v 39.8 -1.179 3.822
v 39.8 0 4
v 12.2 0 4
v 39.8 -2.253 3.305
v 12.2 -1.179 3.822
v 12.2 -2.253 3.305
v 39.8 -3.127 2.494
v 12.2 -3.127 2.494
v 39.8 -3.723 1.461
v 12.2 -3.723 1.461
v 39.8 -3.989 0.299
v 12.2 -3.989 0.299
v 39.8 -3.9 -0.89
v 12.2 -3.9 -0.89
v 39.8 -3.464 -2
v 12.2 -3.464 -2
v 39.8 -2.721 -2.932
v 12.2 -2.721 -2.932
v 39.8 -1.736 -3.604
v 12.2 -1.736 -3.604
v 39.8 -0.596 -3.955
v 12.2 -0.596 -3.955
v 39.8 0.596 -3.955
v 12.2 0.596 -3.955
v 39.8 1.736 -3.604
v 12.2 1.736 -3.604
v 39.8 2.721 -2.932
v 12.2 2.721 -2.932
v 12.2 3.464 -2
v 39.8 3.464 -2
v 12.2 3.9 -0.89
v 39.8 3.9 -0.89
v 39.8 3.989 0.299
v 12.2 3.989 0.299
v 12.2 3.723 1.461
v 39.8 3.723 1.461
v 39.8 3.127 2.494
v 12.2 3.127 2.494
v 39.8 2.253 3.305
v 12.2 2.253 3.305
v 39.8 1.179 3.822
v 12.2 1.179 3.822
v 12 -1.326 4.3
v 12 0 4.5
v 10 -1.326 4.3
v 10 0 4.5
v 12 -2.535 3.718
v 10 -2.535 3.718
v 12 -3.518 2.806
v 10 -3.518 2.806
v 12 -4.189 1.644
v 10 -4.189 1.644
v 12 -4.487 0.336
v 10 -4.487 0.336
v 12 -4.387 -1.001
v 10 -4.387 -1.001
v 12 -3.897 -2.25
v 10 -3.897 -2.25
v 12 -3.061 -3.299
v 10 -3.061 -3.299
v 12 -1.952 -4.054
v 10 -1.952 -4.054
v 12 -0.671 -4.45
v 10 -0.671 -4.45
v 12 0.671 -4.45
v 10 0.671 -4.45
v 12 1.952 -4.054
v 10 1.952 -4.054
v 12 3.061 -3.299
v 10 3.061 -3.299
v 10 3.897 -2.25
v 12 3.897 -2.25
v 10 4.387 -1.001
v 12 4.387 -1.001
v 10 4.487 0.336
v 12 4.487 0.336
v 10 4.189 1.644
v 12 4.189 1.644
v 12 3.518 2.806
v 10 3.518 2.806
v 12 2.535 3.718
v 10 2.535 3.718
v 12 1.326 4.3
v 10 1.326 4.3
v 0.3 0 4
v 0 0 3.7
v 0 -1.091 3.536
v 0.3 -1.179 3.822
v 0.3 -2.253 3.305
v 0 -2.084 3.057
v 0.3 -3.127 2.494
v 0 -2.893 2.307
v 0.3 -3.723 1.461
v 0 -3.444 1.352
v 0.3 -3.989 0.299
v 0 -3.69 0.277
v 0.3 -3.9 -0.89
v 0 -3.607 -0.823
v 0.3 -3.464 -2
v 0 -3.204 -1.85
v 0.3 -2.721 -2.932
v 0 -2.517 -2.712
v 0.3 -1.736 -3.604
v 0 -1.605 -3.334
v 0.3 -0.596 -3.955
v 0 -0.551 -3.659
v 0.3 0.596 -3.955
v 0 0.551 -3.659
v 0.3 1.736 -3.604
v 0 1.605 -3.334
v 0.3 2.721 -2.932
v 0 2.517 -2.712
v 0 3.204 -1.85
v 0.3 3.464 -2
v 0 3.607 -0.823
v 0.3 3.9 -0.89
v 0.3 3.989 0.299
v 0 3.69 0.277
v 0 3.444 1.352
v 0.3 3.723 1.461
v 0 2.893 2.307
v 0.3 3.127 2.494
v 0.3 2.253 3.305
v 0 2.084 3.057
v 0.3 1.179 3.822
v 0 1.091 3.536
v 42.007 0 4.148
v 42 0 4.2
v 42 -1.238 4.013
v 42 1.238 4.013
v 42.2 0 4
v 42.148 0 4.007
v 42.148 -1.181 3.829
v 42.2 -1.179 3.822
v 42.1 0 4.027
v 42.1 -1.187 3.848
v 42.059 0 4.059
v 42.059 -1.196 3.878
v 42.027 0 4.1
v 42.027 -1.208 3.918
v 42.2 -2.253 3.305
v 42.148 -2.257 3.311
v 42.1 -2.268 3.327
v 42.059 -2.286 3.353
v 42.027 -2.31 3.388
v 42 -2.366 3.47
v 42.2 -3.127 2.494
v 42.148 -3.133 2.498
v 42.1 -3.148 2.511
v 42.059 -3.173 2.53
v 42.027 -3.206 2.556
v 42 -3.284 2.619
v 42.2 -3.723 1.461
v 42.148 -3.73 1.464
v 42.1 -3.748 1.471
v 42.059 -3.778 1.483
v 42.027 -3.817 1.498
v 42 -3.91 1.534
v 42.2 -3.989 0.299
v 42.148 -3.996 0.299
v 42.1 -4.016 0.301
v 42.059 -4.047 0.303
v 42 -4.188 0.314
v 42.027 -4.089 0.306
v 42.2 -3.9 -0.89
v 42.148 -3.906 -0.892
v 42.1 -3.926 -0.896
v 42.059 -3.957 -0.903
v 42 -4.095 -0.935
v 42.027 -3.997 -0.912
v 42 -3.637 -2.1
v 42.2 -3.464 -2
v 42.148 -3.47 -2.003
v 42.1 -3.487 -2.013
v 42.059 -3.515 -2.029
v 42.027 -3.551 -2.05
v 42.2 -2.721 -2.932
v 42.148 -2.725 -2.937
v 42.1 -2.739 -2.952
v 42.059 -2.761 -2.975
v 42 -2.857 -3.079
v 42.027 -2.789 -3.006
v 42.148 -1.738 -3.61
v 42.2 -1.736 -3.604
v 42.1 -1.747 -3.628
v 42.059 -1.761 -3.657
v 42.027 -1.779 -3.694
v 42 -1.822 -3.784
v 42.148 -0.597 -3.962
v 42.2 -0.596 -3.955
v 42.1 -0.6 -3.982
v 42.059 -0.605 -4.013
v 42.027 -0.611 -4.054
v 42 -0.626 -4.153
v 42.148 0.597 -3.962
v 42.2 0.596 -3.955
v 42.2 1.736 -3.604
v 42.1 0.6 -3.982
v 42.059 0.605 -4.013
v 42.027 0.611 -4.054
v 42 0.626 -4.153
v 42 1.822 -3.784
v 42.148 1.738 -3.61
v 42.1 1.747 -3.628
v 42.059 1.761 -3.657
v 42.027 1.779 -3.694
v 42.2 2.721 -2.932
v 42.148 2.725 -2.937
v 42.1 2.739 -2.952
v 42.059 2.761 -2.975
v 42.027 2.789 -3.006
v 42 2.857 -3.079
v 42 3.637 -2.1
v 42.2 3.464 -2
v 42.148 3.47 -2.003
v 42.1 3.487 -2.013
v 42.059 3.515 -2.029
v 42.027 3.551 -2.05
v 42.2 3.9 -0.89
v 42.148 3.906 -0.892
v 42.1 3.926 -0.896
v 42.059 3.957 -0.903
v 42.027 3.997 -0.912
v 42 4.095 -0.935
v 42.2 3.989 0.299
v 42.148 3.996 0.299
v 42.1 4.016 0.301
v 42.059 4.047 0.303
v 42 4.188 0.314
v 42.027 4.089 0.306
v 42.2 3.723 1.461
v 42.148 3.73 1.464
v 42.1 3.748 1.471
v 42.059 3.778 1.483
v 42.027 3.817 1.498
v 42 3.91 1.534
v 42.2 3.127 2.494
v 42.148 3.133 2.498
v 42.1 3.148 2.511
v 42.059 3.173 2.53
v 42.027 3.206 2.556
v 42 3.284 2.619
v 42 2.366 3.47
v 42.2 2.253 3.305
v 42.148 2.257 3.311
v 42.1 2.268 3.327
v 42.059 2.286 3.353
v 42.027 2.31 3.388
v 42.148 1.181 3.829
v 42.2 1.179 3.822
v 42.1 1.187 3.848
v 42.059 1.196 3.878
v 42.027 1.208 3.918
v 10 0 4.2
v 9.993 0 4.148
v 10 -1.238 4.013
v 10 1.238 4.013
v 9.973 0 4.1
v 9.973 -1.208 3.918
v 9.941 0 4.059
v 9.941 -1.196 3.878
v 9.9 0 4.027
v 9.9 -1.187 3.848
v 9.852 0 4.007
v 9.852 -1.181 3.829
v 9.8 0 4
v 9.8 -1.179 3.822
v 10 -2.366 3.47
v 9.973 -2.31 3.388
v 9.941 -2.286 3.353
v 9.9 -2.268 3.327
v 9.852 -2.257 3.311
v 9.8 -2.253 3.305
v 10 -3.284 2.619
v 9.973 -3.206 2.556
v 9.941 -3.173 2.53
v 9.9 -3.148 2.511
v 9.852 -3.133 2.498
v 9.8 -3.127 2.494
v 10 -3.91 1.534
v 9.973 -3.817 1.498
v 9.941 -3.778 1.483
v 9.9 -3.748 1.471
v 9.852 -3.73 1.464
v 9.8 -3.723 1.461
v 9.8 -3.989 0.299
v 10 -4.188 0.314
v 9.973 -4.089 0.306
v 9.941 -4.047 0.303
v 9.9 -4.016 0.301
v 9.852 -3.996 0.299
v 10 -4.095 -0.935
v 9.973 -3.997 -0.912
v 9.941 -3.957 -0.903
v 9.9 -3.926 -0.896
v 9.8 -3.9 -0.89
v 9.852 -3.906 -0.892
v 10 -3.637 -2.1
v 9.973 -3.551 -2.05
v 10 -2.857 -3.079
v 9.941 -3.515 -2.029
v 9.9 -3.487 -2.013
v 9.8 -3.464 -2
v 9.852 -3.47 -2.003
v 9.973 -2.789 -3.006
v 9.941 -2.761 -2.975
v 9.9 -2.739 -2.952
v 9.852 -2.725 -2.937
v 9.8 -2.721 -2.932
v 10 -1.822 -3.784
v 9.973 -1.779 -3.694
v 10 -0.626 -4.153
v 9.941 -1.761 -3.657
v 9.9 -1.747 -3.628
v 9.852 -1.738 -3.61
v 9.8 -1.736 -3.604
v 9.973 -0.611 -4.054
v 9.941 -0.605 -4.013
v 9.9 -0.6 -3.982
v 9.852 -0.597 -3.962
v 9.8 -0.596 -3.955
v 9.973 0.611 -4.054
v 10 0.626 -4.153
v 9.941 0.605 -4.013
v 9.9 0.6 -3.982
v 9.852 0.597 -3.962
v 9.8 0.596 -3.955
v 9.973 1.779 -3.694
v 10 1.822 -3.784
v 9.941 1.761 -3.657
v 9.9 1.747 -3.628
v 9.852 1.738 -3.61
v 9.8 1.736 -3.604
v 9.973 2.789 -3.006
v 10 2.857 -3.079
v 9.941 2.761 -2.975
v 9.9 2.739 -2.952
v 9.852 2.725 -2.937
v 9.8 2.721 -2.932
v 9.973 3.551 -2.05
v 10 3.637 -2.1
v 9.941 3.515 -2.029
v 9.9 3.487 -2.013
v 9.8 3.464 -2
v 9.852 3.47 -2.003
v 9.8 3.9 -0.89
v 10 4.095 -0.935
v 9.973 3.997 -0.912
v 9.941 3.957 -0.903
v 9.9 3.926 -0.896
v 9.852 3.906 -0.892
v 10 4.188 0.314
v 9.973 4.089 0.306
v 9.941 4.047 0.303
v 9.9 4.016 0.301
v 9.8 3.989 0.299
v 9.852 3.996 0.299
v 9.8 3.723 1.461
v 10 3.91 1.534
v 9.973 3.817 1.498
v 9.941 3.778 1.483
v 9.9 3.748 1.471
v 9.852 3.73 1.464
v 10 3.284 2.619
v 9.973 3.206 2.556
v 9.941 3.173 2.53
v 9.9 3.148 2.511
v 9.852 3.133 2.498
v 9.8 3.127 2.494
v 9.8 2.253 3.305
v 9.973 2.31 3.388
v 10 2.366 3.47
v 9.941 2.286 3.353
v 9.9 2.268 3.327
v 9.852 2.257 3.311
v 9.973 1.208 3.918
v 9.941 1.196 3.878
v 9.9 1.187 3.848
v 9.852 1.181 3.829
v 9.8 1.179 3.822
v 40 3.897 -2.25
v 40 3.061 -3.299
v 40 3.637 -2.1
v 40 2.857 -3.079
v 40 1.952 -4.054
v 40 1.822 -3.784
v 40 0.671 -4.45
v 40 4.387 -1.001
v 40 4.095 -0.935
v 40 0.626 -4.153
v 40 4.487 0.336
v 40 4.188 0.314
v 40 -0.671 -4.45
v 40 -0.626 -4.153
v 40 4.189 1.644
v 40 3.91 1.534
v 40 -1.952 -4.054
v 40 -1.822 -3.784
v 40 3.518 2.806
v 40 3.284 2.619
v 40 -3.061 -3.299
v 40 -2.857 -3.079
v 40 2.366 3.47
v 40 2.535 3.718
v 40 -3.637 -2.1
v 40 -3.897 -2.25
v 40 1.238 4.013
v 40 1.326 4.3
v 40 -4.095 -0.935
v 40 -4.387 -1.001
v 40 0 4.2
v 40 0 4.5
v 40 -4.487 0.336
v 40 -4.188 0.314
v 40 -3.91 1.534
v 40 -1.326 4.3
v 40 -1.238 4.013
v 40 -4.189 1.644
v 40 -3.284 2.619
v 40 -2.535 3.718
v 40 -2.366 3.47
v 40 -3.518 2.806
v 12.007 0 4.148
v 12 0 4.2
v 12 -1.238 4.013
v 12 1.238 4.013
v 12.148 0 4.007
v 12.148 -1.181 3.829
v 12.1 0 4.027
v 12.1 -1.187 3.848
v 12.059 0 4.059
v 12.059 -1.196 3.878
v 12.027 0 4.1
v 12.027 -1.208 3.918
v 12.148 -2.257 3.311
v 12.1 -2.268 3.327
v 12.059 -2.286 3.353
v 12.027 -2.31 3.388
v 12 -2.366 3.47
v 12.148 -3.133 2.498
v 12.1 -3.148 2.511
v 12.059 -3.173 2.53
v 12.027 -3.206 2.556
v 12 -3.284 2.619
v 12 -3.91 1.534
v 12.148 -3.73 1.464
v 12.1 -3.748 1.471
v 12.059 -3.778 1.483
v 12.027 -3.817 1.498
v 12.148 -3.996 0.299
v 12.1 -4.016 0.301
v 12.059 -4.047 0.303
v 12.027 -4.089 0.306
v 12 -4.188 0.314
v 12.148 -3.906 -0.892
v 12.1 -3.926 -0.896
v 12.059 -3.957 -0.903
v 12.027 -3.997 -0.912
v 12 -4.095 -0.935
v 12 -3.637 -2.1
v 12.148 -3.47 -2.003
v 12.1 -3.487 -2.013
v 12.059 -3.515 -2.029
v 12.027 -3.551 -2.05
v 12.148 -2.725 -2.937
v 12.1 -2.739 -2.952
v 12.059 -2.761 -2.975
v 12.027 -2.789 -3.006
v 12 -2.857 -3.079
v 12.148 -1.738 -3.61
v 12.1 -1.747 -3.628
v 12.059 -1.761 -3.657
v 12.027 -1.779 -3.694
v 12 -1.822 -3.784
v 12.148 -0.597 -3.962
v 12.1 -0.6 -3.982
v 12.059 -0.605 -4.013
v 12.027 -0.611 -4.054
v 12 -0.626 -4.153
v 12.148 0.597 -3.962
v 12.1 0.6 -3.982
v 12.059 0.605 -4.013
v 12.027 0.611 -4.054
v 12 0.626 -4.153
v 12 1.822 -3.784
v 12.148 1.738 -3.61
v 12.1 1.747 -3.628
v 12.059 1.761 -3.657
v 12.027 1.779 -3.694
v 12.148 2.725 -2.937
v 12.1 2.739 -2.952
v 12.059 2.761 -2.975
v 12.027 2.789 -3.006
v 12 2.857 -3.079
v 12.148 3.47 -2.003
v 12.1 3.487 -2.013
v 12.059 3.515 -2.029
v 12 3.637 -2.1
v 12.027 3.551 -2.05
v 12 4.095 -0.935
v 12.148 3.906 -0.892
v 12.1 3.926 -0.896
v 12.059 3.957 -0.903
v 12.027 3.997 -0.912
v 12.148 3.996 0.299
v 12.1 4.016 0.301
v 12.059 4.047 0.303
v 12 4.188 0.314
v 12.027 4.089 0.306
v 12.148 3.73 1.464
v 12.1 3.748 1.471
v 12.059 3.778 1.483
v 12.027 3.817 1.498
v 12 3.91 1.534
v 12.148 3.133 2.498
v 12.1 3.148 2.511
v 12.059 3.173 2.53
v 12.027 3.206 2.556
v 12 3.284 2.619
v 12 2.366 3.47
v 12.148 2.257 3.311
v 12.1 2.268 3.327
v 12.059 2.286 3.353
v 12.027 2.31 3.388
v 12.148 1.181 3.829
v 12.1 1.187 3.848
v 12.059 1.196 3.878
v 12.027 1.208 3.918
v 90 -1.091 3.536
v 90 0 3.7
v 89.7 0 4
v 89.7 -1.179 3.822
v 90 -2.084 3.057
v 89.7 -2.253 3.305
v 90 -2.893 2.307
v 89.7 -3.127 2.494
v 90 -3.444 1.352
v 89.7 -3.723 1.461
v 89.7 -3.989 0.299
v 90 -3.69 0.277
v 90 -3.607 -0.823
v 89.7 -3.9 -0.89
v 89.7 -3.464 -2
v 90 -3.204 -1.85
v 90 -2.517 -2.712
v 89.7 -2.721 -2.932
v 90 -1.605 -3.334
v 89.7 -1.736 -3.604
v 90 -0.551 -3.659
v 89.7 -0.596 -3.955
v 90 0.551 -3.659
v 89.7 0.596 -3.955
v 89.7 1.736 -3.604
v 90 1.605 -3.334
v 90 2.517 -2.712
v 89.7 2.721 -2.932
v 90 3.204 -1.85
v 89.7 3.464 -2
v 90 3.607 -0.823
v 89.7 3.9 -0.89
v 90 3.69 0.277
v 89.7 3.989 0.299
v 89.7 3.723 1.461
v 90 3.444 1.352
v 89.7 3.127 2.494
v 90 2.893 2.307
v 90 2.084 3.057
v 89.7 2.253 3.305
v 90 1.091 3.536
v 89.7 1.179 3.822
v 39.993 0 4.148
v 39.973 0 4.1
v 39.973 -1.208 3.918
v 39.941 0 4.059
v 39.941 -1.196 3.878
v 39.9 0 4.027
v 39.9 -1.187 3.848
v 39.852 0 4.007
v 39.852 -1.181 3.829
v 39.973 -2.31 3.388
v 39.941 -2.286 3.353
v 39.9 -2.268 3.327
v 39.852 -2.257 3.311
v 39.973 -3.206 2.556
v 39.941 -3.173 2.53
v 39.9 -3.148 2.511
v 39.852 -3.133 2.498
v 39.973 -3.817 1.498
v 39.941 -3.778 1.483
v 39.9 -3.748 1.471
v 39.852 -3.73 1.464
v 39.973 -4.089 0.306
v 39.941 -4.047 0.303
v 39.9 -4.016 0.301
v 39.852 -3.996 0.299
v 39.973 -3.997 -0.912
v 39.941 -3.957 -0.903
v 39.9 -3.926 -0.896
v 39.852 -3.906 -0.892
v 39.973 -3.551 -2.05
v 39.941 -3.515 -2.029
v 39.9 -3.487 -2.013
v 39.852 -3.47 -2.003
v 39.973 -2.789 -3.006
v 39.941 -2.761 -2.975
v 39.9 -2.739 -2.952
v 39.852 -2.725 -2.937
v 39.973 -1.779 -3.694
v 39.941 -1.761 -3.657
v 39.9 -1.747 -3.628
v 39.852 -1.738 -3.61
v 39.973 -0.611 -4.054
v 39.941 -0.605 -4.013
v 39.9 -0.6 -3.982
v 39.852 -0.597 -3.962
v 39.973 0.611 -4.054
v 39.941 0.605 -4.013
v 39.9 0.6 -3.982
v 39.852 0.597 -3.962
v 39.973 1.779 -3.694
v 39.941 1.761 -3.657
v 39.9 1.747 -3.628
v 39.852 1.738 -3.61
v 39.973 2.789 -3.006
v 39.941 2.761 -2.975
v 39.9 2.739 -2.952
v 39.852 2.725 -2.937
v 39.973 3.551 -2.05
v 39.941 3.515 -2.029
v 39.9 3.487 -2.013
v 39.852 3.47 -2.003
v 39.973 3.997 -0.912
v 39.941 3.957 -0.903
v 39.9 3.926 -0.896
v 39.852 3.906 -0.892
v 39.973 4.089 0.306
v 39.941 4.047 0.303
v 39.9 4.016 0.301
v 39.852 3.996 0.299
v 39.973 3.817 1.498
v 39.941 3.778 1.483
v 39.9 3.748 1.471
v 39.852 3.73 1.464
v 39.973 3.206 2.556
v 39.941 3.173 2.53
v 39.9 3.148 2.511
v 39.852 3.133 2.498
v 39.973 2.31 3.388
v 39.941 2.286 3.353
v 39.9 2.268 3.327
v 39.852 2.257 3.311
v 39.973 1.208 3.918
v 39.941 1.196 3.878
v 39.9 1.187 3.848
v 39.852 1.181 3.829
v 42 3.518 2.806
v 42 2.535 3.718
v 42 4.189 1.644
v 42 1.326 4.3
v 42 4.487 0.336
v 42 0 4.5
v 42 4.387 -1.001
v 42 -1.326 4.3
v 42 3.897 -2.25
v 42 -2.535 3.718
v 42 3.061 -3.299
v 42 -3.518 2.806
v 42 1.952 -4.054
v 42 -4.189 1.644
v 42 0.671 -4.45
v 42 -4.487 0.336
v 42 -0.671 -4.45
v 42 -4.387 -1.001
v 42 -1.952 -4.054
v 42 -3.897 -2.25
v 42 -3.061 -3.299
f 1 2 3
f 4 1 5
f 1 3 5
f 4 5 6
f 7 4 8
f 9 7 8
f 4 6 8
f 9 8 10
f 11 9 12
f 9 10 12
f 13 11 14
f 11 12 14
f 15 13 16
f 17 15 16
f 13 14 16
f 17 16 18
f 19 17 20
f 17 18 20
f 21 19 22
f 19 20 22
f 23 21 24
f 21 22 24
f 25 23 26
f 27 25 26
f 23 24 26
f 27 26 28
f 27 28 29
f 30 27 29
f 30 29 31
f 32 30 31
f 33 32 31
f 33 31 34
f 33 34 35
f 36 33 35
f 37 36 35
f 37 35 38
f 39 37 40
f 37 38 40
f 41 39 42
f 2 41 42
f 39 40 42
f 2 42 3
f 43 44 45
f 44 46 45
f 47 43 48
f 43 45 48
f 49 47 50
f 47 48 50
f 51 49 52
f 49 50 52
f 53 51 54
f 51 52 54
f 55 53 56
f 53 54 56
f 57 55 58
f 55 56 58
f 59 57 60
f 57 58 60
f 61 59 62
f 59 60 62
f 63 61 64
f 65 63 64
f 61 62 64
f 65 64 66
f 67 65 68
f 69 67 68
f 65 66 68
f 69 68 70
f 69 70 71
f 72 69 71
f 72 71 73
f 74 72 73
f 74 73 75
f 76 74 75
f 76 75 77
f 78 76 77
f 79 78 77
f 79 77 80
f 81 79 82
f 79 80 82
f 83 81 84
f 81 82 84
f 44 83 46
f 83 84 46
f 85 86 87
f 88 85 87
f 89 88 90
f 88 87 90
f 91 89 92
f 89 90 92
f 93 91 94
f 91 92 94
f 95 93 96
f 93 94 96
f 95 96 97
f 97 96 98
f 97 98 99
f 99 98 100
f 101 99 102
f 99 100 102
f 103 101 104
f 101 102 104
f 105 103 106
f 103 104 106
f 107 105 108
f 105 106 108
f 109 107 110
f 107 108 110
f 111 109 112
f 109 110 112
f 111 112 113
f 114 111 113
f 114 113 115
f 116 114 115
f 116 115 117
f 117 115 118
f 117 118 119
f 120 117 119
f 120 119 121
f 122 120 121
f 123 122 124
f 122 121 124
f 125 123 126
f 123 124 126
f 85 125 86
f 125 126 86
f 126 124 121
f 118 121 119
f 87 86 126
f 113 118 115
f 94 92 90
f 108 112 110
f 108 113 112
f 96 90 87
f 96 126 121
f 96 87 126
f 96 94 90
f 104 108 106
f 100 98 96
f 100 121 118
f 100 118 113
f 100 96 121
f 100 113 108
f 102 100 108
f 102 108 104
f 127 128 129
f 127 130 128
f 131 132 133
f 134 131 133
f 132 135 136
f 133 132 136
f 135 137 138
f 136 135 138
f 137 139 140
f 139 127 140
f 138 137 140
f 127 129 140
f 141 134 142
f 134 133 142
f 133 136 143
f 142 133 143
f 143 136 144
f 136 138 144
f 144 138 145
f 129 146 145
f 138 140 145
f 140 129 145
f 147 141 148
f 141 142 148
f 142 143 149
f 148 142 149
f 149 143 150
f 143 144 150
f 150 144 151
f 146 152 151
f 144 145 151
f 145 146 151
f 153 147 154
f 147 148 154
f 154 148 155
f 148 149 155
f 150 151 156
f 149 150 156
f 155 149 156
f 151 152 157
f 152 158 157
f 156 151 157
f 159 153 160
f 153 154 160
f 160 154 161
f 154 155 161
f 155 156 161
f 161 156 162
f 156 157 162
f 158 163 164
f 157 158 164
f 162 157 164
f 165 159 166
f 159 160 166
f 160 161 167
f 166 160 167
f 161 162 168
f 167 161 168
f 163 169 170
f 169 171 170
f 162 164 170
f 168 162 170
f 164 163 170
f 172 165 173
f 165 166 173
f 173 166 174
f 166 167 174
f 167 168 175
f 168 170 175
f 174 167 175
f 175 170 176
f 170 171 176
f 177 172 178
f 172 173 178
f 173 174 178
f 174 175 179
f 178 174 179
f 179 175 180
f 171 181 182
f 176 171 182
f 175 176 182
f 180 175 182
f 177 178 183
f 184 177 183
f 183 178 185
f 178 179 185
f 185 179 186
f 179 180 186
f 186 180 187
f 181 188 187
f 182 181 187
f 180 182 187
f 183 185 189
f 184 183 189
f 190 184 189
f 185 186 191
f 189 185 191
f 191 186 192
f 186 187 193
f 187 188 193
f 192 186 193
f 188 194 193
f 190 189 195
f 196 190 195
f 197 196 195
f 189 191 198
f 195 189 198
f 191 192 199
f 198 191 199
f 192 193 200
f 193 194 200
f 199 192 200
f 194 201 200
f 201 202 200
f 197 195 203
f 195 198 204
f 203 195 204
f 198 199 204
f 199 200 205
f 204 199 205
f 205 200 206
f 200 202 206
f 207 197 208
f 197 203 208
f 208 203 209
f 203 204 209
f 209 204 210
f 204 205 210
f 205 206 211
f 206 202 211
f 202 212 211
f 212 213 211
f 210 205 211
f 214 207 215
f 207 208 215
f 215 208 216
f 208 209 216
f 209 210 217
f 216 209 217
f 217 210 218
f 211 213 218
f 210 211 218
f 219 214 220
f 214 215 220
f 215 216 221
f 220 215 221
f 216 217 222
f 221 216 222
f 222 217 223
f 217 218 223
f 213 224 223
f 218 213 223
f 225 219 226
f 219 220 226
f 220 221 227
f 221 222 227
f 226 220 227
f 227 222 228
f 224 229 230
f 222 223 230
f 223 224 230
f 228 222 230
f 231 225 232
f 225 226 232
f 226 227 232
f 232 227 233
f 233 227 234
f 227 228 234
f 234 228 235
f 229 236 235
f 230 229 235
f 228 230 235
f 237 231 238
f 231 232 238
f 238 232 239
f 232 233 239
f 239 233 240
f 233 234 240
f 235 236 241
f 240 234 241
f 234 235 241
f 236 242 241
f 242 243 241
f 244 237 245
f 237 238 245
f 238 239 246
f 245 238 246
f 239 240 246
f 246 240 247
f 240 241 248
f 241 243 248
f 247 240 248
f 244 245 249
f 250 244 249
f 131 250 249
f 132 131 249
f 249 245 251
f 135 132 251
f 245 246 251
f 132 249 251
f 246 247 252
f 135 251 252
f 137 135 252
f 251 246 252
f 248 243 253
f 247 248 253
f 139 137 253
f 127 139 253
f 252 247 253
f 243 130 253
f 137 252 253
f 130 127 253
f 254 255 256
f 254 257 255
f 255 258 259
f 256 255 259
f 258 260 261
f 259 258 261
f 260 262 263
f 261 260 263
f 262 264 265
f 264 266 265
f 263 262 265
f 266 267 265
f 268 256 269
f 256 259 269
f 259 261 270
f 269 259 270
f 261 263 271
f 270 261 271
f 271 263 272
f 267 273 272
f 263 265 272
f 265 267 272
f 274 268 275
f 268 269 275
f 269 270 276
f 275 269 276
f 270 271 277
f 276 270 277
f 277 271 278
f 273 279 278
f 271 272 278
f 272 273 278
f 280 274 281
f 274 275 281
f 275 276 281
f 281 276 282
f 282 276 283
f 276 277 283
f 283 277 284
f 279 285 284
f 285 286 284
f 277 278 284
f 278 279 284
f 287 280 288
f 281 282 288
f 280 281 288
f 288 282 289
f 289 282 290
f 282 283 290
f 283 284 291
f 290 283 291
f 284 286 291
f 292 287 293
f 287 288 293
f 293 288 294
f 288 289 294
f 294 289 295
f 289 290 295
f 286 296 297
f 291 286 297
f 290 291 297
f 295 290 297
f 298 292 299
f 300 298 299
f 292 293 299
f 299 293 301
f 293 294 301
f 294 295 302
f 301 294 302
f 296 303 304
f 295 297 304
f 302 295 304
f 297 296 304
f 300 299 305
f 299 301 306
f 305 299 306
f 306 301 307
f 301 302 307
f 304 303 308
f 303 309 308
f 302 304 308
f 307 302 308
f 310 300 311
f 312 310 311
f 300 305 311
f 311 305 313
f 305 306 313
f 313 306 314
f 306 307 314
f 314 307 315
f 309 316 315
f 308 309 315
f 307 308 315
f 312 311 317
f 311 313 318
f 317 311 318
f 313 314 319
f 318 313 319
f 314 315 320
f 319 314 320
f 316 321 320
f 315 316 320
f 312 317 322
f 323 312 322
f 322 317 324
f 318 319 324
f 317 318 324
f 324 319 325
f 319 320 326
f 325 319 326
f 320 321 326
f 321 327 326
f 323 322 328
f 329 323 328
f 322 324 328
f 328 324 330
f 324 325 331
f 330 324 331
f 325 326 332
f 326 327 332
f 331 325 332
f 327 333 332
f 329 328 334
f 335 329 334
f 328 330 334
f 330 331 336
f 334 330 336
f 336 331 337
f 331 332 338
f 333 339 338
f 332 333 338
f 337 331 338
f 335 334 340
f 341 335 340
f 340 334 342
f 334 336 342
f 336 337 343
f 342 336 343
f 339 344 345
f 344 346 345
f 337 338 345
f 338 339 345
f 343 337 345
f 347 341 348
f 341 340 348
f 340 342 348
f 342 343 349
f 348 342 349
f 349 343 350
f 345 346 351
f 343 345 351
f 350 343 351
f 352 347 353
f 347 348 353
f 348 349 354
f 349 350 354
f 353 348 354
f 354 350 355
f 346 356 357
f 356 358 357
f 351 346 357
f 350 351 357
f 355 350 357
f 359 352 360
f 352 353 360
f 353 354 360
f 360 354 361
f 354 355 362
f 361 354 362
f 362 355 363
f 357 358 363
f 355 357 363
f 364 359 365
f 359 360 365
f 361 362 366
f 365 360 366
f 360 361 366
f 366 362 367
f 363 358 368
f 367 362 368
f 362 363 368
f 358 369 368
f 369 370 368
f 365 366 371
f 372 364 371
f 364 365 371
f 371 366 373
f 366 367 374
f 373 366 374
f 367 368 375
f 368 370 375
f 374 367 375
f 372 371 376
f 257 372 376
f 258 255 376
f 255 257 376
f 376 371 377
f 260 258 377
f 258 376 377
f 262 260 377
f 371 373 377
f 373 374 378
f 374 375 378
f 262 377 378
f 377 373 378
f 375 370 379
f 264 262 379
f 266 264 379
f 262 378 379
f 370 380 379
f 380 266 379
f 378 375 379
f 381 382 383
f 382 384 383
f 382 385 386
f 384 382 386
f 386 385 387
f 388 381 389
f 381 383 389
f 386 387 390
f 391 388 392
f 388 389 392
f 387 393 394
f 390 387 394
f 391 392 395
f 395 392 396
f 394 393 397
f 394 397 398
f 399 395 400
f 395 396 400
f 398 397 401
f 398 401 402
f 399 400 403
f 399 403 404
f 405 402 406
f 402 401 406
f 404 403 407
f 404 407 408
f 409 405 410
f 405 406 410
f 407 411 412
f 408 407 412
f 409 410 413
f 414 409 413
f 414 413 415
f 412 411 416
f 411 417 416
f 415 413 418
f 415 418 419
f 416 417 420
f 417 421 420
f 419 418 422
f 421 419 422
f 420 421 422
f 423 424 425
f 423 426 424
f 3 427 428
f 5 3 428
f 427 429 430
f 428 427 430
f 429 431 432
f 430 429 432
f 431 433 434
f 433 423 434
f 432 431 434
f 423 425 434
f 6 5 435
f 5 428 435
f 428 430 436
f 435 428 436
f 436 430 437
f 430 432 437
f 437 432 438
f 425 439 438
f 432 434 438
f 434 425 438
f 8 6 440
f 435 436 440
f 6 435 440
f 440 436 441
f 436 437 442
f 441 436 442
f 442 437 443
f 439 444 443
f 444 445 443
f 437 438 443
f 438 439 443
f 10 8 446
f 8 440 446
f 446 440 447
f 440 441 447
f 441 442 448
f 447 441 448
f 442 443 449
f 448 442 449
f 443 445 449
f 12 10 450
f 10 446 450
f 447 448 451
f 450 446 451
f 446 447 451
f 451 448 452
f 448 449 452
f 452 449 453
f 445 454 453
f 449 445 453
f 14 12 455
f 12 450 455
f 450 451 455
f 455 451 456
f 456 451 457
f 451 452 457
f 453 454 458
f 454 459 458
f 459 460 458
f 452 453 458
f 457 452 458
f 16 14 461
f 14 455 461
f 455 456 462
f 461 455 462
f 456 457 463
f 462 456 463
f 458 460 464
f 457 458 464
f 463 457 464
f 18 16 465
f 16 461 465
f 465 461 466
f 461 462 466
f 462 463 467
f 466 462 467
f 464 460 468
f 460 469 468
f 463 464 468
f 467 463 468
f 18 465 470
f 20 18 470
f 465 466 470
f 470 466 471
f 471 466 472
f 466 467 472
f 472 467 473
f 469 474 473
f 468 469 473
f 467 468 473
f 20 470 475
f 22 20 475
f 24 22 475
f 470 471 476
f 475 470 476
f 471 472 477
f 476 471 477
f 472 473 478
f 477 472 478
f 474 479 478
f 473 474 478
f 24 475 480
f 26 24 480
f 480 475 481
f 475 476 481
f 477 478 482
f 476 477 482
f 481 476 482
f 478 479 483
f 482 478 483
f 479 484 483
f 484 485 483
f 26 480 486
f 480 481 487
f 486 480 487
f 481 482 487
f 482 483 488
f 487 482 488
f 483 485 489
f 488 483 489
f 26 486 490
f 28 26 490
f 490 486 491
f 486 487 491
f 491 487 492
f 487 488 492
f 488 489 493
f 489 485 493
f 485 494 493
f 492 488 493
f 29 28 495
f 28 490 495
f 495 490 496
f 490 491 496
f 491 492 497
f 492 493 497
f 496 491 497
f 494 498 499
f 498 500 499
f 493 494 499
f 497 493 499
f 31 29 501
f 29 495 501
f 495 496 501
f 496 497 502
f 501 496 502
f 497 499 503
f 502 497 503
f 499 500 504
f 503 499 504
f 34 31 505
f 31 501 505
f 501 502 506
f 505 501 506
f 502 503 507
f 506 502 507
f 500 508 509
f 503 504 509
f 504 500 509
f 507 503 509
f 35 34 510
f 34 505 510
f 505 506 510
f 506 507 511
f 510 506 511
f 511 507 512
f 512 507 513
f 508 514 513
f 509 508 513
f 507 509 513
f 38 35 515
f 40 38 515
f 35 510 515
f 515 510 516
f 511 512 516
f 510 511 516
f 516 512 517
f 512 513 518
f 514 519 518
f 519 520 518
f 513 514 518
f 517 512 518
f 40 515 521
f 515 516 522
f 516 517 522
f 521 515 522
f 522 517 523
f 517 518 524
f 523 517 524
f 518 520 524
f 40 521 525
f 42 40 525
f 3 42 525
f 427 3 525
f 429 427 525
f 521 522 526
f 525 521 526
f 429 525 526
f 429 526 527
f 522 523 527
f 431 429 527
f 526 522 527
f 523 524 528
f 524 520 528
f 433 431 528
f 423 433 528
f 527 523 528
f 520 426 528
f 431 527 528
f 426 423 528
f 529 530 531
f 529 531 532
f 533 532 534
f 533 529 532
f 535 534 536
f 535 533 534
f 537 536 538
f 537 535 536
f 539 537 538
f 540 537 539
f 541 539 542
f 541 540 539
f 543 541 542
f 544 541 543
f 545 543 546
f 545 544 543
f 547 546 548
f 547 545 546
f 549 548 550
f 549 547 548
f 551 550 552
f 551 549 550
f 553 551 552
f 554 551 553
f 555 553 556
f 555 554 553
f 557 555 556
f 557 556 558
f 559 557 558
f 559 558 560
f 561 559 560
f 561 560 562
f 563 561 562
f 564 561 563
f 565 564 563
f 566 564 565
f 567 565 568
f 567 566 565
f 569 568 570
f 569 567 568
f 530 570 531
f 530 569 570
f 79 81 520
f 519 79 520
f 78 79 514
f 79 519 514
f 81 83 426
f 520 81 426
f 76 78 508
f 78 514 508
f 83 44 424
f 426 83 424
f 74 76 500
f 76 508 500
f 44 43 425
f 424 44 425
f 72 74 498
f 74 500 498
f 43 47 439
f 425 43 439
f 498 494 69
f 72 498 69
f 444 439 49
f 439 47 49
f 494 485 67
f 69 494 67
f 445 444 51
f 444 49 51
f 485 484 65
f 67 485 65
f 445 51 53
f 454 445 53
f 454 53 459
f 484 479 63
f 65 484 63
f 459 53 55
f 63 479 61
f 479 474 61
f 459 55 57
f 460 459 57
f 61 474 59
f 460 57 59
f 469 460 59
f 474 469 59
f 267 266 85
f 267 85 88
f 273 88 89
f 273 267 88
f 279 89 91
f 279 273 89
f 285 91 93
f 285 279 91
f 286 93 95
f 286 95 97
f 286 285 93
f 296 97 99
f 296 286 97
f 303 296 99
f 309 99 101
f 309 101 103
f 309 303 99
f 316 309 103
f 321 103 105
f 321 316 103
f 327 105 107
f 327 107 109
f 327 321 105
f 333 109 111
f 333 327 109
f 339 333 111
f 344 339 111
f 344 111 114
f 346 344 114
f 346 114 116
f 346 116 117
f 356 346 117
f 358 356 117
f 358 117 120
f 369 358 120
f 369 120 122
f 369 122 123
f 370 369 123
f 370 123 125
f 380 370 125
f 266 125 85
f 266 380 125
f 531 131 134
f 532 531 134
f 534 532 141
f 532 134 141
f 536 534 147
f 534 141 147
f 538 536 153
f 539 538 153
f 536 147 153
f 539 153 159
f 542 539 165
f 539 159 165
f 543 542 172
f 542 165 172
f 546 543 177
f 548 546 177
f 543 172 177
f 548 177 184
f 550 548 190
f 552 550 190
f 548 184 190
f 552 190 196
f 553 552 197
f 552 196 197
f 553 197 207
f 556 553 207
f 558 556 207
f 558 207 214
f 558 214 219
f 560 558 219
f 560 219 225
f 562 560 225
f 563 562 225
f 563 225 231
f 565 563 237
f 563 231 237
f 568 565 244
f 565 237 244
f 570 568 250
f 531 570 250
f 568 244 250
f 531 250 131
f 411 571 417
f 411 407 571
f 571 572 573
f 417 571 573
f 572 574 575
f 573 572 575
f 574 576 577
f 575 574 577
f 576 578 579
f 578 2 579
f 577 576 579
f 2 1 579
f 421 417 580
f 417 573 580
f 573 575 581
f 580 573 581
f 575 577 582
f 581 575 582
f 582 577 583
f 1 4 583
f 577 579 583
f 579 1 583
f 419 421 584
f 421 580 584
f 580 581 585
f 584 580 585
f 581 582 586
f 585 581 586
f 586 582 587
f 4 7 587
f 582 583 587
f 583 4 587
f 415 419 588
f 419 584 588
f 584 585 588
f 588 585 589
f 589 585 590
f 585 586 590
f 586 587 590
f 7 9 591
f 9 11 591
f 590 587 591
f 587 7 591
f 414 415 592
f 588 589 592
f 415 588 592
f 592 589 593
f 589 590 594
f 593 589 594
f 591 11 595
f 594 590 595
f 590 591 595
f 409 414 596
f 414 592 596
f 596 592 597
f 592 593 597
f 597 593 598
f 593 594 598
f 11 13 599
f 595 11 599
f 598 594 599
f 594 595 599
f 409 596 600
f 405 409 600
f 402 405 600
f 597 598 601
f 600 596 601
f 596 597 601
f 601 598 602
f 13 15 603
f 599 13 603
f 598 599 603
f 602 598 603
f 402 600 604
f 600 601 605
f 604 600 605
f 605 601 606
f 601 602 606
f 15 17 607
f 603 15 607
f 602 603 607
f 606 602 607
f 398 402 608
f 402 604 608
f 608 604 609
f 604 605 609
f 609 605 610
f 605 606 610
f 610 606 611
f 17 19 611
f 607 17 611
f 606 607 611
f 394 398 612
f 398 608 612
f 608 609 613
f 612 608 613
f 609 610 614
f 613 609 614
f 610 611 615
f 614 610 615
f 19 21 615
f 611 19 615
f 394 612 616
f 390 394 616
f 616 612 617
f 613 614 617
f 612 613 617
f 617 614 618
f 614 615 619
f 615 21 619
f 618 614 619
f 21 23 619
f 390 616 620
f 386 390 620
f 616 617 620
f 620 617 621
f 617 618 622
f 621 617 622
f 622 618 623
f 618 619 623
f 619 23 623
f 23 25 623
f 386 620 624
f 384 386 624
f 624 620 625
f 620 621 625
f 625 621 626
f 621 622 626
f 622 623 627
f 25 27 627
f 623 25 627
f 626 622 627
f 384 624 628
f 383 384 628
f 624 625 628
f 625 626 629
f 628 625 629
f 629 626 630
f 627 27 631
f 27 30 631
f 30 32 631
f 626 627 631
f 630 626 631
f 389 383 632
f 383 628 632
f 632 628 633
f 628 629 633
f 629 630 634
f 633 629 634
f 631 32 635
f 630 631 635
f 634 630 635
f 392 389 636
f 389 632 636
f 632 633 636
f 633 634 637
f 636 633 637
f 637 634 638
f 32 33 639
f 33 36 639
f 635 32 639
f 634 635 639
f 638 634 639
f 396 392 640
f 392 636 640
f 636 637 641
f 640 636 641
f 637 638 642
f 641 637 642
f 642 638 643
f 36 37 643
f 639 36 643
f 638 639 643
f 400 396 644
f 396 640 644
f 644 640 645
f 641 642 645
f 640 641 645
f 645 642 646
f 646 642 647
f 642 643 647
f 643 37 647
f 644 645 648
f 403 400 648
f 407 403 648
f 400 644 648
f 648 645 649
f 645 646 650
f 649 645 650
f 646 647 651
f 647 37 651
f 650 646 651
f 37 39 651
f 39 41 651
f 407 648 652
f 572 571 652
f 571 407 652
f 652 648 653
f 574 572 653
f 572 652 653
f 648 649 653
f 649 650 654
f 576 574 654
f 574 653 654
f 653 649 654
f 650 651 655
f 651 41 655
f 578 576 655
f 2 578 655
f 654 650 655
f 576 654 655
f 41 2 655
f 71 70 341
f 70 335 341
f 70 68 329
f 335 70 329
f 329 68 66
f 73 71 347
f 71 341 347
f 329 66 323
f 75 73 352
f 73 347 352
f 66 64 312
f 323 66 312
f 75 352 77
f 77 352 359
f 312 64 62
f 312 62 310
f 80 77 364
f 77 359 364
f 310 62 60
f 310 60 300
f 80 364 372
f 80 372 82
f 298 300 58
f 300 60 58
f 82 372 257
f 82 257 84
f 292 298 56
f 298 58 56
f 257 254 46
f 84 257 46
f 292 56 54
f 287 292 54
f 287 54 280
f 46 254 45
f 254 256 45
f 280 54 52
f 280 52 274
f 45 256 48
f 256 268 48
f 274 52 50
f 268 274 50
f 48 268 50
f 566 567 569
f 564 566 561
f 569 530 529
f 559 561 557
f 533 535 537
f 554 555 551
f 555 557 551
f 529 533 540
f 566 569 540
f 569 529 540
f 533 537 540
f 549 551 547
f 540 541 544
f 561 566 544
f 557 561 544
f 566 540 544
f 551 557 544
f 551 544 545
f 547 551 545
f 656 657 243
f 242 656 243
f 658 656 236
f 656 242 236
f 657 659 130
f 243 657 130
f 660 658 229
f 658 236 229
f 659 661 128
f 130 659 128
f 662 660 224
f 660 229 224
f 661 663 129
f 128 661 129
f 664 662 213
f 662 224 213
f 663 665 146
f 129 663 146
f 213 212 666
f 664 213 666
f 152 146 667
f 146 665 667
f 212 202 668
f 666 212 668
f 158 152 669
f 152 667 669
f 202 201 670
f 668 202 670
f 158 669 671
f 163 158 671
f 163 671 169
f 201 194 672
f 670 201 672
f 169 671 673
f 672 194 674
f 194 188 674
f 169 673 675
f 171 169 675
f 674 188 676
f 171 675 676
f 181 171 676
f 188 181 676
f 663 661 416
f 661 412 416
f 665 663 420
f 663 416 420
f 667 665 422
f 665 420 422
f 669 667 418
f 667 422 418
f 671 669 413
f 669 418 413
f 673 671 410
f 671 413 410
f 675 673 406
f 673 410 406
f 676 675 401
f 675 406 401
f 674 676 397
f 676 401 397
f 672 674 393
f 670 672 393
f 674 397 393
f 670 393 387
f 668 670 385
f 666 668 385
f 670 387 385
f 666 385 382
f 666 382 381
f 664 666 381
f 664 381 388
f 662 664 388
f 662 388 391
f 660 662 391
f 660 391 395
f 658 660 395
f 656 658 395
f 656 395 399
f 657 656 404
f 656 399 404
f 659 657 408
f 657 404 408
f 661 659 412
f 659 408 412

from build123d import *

# Parameters (mm, degrees)
SKETCH1_W     = 10
SKETCH1_H     = 4
SKETCH1_W_2   = 8
SKETCH1_W_3   = 12
SKETCH1_W_4   = 38
FILLET1_R     = 0.2
CHAMFER1_SIZE = 0.3


with BuildPart() as part:
    # Sketch1 → Revolve1 (revolve)
    with BuildSketch(Plane.XY, mode=Mode.PRIVATE) as revolve1_sk:
        with Locations((5, 2)):
            Rectangle(SKETCH1_W, SKETCH1_H)
        Polygon((10, 4.5), (10, 4), (10, 0), (12, 0), (12, 4), (12, 4.5), align=None)
        with Locations((16, 2)):
            Rectangle(SKETCH1_W_2, SKETCH1_H)
        with Locations((26, 2)):
            Rectangle(SKETCH1_W_3, SKETCH1_H)
        with Locations((36, 2)):
            Rectangle(SKETCH1_W_2, SKETCH1_H)
        Polygon((40, 4), (40, 0), (42, 0), (42, 4), (42, 4.5), (40, 4.5), align=None)
        with Locations((47, 2)):
            Rectangle(SKETCH1_W, SKETCH1_H)
        with Locations((71, 2)):
            Rectangle(SKETCH1_W_4, SKETCH1_H)
    revolve(revolve1_sk.sketch.rotate(Axis((0, 0, 0), (1, 0, 0)), 90), axis=Axis((0, 0, 0), (1, 0, 0)))

    # Fillet1
    fillet1_edges = [part.edges().sort_by_distance(p)[0] for p in [
        (10, 0, -4),
        (12, 0, -4),
        (40, 0, -4),
        (42, 0, -4),
    ]]
    fillet(fillet1_edges, radius=FILLET1_R)

    # Chamfer1
    chamfer1_edges = [part.edges().sort_by_distance(p)[0] for p in [
        (90, 0, -4),
        (0, 0, -4),
    ]]
    chamfer(chamfer1_edges, length=CHAMFER1_SIZE)


solid = part.part
